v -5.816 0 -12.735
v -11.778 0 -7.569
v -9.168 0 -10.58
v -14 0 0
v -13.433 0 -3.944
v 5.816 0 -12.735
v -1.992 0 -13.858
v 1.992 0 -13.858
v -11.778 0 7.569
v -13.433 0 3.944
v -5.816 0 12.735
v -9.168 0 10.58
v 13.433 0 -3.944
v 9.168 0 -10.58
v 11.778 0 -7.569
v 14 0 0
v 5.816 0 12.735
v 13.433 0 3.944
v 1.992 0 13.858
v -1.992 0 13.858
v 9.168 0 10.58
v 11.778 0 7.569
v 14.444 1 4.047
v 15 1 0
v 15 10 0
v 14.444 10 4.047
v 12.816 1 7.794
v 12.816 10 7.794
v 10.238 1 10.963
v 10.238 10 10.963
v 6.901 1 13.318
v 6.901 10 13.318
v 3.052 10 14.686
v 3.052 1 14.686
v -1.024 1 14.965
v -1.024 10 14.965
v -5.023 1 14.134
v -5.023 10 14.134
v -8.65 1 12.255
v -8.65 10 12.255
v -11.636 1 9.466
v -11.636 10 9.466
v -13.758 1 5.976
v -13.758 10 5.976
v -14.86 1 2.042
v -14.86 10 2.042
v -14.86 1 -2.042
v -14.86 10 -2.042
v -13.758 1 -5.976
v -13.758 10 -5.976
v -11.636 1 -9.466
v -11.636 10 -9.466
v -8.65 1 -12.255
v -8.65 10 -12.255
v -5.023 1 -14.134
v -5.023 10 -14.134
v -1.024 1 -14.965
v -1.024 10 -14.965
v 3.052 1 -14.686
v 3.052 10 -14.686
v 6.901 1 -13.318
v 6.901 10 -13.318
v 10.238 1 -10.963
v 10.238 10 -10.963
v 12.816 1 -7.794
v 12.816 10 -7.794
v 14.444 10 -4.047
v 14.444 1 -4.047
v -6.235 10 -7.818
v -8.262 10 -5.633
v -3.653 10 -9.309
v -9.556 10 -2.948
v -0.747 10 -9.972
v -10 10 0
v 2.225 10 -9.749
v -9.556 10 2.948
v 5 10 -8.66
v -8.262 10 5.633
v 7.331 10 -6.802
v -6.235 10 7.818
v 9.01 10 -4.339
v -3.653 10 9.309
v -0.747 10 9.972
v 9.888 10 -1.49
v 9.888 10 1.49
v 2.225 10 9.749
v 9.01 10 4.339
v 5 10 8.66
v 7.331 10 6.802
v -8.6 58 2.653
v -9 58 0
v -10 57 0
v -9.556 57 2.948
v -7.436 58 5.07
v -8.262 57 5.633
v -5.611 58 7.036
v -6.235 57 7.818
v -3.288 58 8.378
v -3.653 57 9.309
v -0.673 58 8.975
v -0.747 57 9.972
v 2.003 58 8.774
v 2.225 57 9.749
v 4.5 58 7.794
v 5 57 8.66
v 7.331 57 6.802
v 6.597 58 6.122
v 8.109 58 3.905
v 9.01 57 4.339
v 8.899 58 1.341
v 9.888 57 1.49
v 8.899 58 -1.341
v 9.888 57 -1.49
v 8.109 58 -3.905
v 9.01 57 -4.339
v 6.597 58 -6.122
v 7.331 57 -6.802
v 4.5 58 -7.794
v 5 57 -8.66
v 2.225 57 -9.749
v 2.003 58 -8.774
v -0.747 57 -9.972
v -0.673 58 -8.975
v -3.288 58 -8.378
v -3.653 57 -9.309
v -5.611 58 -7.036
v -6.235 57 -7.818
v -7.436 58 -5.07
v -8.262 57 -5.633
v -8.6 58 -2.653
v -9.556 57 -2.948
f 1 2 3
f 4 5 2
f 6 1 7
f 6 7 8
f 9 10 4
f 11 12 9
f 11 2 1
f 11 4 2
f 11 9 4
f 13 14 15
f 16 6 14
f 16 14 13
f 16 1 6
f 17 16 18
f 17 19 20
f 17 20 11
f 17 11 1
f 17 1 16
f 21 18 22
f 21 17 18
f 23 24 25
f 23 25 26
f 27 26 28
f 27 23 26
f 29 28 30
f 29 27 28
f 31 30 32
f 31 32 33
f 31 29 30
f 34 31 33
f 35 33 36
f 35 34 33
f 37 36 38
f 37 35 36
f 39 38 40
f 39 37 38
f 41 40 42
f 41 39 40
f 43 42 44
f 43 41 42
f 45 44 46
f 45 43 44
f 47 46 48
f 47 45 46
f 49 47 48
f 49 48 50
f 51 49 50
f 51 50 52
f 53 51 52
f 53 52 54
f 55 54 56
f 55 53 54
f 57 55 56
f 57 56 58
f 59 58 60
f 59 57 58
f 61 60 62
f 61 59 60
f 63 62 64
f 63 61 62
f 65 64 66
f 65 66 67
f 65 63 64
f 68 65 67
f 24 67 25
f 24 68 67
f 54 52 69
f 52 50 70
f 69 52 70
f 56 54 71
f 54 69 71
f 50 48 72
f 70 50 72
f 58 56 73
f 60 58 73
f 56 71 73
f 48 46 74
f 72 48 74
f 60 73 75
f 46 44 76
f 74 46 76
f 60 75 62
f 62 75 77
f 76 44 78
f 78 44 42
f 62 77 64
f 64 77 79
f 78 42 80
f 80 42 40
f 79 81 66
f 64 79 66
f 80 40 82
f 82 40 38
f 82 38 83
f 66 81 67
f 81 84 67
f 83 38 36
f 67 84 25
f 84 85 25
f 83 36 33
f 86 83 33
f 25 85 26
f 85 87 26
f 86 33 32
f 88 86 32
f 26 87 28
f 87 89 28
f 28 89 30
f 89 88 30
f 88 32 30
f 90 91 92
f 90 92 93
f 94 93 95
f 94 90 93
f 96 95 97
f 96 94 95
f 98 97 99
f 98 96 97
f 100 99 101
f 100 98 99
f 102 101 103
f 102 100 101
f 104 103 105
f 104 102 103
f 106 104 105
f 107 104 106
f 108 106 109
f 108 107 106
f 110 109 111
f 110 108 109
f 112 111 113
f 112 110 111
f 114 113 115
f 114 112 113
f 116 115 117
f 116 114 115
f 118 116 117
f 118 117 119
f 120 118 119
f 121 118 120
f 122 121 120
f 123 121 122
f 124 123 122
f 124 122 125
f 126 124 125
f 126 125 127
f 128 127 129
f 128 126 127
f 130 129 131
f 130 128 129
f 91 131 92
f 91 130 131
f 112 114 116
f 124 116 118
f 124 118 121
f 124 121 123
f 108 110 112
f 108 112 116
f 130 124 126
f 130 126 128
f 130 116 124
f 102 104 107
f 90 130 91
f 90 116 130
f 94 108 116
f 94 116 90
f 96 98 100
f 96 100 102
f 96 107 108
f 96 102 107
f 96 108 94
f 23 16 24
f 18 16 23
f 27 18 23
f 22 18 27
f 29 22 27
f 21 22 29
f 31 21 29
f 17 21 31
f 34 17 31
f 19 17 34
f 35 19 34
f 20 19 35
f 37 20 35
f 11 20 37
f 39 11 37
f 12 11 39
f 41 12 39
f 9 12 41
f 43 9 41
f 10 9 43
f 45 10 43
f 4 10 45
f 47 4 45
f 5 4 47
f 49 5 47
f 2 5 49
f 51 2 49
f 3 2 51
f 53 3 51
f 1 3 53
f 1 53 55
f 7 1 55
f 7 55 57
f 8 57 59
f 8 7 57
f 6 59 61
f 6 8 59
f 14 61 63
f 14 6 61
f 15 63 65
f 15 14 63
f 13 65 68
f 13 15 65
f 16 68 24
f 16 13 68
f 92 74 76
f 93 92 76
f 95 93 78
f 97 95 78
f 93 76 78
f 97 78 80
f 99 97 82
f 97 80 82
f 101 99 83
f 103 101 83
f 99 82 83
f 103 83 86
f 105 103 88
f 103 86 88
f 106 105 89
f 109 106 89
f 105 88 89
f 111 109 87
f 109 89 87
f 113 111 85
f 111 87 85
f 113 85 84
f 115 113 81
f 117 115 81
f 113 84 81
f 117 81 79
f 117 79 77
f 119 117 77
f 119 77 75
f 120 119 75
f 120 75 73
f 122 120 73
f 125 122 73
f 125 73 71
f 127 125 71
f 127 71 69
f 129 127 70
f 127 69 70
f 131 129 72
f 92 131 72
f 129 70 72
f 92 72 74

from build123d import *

# Parameters (mm, degrees)
F0_R     = 15
F1_DEPTH = 10
F2_R     = 10
F3_DEPTH = 48
F4_SIZE  = 1


with BuildPart() as f1:
    # F0 (on Front) → F1 (new body)
    with BuildSketch(Plane.XZ):
        Circle(F0_R)
    extrude(amount=-F1_DEPTH)

    # F2 (on face) → F3 (join)
    with BuildSketch(Plane(origin=(0, 10, 0), x_dir=(-1, 0, 0), z_dir=(0, 1, 0))):
        Circle(F2_R)
    extrude(amount=F3_DEPTH)

    # F4
    f4_edges = [f1.edges().sort_by_distance(p)[0] for p in [
        (10, 58, 0),
        (-15, 0, 0),
    ]]
    chamfer(f4_edges, length=F4_SIZE)


solid = f1.part
